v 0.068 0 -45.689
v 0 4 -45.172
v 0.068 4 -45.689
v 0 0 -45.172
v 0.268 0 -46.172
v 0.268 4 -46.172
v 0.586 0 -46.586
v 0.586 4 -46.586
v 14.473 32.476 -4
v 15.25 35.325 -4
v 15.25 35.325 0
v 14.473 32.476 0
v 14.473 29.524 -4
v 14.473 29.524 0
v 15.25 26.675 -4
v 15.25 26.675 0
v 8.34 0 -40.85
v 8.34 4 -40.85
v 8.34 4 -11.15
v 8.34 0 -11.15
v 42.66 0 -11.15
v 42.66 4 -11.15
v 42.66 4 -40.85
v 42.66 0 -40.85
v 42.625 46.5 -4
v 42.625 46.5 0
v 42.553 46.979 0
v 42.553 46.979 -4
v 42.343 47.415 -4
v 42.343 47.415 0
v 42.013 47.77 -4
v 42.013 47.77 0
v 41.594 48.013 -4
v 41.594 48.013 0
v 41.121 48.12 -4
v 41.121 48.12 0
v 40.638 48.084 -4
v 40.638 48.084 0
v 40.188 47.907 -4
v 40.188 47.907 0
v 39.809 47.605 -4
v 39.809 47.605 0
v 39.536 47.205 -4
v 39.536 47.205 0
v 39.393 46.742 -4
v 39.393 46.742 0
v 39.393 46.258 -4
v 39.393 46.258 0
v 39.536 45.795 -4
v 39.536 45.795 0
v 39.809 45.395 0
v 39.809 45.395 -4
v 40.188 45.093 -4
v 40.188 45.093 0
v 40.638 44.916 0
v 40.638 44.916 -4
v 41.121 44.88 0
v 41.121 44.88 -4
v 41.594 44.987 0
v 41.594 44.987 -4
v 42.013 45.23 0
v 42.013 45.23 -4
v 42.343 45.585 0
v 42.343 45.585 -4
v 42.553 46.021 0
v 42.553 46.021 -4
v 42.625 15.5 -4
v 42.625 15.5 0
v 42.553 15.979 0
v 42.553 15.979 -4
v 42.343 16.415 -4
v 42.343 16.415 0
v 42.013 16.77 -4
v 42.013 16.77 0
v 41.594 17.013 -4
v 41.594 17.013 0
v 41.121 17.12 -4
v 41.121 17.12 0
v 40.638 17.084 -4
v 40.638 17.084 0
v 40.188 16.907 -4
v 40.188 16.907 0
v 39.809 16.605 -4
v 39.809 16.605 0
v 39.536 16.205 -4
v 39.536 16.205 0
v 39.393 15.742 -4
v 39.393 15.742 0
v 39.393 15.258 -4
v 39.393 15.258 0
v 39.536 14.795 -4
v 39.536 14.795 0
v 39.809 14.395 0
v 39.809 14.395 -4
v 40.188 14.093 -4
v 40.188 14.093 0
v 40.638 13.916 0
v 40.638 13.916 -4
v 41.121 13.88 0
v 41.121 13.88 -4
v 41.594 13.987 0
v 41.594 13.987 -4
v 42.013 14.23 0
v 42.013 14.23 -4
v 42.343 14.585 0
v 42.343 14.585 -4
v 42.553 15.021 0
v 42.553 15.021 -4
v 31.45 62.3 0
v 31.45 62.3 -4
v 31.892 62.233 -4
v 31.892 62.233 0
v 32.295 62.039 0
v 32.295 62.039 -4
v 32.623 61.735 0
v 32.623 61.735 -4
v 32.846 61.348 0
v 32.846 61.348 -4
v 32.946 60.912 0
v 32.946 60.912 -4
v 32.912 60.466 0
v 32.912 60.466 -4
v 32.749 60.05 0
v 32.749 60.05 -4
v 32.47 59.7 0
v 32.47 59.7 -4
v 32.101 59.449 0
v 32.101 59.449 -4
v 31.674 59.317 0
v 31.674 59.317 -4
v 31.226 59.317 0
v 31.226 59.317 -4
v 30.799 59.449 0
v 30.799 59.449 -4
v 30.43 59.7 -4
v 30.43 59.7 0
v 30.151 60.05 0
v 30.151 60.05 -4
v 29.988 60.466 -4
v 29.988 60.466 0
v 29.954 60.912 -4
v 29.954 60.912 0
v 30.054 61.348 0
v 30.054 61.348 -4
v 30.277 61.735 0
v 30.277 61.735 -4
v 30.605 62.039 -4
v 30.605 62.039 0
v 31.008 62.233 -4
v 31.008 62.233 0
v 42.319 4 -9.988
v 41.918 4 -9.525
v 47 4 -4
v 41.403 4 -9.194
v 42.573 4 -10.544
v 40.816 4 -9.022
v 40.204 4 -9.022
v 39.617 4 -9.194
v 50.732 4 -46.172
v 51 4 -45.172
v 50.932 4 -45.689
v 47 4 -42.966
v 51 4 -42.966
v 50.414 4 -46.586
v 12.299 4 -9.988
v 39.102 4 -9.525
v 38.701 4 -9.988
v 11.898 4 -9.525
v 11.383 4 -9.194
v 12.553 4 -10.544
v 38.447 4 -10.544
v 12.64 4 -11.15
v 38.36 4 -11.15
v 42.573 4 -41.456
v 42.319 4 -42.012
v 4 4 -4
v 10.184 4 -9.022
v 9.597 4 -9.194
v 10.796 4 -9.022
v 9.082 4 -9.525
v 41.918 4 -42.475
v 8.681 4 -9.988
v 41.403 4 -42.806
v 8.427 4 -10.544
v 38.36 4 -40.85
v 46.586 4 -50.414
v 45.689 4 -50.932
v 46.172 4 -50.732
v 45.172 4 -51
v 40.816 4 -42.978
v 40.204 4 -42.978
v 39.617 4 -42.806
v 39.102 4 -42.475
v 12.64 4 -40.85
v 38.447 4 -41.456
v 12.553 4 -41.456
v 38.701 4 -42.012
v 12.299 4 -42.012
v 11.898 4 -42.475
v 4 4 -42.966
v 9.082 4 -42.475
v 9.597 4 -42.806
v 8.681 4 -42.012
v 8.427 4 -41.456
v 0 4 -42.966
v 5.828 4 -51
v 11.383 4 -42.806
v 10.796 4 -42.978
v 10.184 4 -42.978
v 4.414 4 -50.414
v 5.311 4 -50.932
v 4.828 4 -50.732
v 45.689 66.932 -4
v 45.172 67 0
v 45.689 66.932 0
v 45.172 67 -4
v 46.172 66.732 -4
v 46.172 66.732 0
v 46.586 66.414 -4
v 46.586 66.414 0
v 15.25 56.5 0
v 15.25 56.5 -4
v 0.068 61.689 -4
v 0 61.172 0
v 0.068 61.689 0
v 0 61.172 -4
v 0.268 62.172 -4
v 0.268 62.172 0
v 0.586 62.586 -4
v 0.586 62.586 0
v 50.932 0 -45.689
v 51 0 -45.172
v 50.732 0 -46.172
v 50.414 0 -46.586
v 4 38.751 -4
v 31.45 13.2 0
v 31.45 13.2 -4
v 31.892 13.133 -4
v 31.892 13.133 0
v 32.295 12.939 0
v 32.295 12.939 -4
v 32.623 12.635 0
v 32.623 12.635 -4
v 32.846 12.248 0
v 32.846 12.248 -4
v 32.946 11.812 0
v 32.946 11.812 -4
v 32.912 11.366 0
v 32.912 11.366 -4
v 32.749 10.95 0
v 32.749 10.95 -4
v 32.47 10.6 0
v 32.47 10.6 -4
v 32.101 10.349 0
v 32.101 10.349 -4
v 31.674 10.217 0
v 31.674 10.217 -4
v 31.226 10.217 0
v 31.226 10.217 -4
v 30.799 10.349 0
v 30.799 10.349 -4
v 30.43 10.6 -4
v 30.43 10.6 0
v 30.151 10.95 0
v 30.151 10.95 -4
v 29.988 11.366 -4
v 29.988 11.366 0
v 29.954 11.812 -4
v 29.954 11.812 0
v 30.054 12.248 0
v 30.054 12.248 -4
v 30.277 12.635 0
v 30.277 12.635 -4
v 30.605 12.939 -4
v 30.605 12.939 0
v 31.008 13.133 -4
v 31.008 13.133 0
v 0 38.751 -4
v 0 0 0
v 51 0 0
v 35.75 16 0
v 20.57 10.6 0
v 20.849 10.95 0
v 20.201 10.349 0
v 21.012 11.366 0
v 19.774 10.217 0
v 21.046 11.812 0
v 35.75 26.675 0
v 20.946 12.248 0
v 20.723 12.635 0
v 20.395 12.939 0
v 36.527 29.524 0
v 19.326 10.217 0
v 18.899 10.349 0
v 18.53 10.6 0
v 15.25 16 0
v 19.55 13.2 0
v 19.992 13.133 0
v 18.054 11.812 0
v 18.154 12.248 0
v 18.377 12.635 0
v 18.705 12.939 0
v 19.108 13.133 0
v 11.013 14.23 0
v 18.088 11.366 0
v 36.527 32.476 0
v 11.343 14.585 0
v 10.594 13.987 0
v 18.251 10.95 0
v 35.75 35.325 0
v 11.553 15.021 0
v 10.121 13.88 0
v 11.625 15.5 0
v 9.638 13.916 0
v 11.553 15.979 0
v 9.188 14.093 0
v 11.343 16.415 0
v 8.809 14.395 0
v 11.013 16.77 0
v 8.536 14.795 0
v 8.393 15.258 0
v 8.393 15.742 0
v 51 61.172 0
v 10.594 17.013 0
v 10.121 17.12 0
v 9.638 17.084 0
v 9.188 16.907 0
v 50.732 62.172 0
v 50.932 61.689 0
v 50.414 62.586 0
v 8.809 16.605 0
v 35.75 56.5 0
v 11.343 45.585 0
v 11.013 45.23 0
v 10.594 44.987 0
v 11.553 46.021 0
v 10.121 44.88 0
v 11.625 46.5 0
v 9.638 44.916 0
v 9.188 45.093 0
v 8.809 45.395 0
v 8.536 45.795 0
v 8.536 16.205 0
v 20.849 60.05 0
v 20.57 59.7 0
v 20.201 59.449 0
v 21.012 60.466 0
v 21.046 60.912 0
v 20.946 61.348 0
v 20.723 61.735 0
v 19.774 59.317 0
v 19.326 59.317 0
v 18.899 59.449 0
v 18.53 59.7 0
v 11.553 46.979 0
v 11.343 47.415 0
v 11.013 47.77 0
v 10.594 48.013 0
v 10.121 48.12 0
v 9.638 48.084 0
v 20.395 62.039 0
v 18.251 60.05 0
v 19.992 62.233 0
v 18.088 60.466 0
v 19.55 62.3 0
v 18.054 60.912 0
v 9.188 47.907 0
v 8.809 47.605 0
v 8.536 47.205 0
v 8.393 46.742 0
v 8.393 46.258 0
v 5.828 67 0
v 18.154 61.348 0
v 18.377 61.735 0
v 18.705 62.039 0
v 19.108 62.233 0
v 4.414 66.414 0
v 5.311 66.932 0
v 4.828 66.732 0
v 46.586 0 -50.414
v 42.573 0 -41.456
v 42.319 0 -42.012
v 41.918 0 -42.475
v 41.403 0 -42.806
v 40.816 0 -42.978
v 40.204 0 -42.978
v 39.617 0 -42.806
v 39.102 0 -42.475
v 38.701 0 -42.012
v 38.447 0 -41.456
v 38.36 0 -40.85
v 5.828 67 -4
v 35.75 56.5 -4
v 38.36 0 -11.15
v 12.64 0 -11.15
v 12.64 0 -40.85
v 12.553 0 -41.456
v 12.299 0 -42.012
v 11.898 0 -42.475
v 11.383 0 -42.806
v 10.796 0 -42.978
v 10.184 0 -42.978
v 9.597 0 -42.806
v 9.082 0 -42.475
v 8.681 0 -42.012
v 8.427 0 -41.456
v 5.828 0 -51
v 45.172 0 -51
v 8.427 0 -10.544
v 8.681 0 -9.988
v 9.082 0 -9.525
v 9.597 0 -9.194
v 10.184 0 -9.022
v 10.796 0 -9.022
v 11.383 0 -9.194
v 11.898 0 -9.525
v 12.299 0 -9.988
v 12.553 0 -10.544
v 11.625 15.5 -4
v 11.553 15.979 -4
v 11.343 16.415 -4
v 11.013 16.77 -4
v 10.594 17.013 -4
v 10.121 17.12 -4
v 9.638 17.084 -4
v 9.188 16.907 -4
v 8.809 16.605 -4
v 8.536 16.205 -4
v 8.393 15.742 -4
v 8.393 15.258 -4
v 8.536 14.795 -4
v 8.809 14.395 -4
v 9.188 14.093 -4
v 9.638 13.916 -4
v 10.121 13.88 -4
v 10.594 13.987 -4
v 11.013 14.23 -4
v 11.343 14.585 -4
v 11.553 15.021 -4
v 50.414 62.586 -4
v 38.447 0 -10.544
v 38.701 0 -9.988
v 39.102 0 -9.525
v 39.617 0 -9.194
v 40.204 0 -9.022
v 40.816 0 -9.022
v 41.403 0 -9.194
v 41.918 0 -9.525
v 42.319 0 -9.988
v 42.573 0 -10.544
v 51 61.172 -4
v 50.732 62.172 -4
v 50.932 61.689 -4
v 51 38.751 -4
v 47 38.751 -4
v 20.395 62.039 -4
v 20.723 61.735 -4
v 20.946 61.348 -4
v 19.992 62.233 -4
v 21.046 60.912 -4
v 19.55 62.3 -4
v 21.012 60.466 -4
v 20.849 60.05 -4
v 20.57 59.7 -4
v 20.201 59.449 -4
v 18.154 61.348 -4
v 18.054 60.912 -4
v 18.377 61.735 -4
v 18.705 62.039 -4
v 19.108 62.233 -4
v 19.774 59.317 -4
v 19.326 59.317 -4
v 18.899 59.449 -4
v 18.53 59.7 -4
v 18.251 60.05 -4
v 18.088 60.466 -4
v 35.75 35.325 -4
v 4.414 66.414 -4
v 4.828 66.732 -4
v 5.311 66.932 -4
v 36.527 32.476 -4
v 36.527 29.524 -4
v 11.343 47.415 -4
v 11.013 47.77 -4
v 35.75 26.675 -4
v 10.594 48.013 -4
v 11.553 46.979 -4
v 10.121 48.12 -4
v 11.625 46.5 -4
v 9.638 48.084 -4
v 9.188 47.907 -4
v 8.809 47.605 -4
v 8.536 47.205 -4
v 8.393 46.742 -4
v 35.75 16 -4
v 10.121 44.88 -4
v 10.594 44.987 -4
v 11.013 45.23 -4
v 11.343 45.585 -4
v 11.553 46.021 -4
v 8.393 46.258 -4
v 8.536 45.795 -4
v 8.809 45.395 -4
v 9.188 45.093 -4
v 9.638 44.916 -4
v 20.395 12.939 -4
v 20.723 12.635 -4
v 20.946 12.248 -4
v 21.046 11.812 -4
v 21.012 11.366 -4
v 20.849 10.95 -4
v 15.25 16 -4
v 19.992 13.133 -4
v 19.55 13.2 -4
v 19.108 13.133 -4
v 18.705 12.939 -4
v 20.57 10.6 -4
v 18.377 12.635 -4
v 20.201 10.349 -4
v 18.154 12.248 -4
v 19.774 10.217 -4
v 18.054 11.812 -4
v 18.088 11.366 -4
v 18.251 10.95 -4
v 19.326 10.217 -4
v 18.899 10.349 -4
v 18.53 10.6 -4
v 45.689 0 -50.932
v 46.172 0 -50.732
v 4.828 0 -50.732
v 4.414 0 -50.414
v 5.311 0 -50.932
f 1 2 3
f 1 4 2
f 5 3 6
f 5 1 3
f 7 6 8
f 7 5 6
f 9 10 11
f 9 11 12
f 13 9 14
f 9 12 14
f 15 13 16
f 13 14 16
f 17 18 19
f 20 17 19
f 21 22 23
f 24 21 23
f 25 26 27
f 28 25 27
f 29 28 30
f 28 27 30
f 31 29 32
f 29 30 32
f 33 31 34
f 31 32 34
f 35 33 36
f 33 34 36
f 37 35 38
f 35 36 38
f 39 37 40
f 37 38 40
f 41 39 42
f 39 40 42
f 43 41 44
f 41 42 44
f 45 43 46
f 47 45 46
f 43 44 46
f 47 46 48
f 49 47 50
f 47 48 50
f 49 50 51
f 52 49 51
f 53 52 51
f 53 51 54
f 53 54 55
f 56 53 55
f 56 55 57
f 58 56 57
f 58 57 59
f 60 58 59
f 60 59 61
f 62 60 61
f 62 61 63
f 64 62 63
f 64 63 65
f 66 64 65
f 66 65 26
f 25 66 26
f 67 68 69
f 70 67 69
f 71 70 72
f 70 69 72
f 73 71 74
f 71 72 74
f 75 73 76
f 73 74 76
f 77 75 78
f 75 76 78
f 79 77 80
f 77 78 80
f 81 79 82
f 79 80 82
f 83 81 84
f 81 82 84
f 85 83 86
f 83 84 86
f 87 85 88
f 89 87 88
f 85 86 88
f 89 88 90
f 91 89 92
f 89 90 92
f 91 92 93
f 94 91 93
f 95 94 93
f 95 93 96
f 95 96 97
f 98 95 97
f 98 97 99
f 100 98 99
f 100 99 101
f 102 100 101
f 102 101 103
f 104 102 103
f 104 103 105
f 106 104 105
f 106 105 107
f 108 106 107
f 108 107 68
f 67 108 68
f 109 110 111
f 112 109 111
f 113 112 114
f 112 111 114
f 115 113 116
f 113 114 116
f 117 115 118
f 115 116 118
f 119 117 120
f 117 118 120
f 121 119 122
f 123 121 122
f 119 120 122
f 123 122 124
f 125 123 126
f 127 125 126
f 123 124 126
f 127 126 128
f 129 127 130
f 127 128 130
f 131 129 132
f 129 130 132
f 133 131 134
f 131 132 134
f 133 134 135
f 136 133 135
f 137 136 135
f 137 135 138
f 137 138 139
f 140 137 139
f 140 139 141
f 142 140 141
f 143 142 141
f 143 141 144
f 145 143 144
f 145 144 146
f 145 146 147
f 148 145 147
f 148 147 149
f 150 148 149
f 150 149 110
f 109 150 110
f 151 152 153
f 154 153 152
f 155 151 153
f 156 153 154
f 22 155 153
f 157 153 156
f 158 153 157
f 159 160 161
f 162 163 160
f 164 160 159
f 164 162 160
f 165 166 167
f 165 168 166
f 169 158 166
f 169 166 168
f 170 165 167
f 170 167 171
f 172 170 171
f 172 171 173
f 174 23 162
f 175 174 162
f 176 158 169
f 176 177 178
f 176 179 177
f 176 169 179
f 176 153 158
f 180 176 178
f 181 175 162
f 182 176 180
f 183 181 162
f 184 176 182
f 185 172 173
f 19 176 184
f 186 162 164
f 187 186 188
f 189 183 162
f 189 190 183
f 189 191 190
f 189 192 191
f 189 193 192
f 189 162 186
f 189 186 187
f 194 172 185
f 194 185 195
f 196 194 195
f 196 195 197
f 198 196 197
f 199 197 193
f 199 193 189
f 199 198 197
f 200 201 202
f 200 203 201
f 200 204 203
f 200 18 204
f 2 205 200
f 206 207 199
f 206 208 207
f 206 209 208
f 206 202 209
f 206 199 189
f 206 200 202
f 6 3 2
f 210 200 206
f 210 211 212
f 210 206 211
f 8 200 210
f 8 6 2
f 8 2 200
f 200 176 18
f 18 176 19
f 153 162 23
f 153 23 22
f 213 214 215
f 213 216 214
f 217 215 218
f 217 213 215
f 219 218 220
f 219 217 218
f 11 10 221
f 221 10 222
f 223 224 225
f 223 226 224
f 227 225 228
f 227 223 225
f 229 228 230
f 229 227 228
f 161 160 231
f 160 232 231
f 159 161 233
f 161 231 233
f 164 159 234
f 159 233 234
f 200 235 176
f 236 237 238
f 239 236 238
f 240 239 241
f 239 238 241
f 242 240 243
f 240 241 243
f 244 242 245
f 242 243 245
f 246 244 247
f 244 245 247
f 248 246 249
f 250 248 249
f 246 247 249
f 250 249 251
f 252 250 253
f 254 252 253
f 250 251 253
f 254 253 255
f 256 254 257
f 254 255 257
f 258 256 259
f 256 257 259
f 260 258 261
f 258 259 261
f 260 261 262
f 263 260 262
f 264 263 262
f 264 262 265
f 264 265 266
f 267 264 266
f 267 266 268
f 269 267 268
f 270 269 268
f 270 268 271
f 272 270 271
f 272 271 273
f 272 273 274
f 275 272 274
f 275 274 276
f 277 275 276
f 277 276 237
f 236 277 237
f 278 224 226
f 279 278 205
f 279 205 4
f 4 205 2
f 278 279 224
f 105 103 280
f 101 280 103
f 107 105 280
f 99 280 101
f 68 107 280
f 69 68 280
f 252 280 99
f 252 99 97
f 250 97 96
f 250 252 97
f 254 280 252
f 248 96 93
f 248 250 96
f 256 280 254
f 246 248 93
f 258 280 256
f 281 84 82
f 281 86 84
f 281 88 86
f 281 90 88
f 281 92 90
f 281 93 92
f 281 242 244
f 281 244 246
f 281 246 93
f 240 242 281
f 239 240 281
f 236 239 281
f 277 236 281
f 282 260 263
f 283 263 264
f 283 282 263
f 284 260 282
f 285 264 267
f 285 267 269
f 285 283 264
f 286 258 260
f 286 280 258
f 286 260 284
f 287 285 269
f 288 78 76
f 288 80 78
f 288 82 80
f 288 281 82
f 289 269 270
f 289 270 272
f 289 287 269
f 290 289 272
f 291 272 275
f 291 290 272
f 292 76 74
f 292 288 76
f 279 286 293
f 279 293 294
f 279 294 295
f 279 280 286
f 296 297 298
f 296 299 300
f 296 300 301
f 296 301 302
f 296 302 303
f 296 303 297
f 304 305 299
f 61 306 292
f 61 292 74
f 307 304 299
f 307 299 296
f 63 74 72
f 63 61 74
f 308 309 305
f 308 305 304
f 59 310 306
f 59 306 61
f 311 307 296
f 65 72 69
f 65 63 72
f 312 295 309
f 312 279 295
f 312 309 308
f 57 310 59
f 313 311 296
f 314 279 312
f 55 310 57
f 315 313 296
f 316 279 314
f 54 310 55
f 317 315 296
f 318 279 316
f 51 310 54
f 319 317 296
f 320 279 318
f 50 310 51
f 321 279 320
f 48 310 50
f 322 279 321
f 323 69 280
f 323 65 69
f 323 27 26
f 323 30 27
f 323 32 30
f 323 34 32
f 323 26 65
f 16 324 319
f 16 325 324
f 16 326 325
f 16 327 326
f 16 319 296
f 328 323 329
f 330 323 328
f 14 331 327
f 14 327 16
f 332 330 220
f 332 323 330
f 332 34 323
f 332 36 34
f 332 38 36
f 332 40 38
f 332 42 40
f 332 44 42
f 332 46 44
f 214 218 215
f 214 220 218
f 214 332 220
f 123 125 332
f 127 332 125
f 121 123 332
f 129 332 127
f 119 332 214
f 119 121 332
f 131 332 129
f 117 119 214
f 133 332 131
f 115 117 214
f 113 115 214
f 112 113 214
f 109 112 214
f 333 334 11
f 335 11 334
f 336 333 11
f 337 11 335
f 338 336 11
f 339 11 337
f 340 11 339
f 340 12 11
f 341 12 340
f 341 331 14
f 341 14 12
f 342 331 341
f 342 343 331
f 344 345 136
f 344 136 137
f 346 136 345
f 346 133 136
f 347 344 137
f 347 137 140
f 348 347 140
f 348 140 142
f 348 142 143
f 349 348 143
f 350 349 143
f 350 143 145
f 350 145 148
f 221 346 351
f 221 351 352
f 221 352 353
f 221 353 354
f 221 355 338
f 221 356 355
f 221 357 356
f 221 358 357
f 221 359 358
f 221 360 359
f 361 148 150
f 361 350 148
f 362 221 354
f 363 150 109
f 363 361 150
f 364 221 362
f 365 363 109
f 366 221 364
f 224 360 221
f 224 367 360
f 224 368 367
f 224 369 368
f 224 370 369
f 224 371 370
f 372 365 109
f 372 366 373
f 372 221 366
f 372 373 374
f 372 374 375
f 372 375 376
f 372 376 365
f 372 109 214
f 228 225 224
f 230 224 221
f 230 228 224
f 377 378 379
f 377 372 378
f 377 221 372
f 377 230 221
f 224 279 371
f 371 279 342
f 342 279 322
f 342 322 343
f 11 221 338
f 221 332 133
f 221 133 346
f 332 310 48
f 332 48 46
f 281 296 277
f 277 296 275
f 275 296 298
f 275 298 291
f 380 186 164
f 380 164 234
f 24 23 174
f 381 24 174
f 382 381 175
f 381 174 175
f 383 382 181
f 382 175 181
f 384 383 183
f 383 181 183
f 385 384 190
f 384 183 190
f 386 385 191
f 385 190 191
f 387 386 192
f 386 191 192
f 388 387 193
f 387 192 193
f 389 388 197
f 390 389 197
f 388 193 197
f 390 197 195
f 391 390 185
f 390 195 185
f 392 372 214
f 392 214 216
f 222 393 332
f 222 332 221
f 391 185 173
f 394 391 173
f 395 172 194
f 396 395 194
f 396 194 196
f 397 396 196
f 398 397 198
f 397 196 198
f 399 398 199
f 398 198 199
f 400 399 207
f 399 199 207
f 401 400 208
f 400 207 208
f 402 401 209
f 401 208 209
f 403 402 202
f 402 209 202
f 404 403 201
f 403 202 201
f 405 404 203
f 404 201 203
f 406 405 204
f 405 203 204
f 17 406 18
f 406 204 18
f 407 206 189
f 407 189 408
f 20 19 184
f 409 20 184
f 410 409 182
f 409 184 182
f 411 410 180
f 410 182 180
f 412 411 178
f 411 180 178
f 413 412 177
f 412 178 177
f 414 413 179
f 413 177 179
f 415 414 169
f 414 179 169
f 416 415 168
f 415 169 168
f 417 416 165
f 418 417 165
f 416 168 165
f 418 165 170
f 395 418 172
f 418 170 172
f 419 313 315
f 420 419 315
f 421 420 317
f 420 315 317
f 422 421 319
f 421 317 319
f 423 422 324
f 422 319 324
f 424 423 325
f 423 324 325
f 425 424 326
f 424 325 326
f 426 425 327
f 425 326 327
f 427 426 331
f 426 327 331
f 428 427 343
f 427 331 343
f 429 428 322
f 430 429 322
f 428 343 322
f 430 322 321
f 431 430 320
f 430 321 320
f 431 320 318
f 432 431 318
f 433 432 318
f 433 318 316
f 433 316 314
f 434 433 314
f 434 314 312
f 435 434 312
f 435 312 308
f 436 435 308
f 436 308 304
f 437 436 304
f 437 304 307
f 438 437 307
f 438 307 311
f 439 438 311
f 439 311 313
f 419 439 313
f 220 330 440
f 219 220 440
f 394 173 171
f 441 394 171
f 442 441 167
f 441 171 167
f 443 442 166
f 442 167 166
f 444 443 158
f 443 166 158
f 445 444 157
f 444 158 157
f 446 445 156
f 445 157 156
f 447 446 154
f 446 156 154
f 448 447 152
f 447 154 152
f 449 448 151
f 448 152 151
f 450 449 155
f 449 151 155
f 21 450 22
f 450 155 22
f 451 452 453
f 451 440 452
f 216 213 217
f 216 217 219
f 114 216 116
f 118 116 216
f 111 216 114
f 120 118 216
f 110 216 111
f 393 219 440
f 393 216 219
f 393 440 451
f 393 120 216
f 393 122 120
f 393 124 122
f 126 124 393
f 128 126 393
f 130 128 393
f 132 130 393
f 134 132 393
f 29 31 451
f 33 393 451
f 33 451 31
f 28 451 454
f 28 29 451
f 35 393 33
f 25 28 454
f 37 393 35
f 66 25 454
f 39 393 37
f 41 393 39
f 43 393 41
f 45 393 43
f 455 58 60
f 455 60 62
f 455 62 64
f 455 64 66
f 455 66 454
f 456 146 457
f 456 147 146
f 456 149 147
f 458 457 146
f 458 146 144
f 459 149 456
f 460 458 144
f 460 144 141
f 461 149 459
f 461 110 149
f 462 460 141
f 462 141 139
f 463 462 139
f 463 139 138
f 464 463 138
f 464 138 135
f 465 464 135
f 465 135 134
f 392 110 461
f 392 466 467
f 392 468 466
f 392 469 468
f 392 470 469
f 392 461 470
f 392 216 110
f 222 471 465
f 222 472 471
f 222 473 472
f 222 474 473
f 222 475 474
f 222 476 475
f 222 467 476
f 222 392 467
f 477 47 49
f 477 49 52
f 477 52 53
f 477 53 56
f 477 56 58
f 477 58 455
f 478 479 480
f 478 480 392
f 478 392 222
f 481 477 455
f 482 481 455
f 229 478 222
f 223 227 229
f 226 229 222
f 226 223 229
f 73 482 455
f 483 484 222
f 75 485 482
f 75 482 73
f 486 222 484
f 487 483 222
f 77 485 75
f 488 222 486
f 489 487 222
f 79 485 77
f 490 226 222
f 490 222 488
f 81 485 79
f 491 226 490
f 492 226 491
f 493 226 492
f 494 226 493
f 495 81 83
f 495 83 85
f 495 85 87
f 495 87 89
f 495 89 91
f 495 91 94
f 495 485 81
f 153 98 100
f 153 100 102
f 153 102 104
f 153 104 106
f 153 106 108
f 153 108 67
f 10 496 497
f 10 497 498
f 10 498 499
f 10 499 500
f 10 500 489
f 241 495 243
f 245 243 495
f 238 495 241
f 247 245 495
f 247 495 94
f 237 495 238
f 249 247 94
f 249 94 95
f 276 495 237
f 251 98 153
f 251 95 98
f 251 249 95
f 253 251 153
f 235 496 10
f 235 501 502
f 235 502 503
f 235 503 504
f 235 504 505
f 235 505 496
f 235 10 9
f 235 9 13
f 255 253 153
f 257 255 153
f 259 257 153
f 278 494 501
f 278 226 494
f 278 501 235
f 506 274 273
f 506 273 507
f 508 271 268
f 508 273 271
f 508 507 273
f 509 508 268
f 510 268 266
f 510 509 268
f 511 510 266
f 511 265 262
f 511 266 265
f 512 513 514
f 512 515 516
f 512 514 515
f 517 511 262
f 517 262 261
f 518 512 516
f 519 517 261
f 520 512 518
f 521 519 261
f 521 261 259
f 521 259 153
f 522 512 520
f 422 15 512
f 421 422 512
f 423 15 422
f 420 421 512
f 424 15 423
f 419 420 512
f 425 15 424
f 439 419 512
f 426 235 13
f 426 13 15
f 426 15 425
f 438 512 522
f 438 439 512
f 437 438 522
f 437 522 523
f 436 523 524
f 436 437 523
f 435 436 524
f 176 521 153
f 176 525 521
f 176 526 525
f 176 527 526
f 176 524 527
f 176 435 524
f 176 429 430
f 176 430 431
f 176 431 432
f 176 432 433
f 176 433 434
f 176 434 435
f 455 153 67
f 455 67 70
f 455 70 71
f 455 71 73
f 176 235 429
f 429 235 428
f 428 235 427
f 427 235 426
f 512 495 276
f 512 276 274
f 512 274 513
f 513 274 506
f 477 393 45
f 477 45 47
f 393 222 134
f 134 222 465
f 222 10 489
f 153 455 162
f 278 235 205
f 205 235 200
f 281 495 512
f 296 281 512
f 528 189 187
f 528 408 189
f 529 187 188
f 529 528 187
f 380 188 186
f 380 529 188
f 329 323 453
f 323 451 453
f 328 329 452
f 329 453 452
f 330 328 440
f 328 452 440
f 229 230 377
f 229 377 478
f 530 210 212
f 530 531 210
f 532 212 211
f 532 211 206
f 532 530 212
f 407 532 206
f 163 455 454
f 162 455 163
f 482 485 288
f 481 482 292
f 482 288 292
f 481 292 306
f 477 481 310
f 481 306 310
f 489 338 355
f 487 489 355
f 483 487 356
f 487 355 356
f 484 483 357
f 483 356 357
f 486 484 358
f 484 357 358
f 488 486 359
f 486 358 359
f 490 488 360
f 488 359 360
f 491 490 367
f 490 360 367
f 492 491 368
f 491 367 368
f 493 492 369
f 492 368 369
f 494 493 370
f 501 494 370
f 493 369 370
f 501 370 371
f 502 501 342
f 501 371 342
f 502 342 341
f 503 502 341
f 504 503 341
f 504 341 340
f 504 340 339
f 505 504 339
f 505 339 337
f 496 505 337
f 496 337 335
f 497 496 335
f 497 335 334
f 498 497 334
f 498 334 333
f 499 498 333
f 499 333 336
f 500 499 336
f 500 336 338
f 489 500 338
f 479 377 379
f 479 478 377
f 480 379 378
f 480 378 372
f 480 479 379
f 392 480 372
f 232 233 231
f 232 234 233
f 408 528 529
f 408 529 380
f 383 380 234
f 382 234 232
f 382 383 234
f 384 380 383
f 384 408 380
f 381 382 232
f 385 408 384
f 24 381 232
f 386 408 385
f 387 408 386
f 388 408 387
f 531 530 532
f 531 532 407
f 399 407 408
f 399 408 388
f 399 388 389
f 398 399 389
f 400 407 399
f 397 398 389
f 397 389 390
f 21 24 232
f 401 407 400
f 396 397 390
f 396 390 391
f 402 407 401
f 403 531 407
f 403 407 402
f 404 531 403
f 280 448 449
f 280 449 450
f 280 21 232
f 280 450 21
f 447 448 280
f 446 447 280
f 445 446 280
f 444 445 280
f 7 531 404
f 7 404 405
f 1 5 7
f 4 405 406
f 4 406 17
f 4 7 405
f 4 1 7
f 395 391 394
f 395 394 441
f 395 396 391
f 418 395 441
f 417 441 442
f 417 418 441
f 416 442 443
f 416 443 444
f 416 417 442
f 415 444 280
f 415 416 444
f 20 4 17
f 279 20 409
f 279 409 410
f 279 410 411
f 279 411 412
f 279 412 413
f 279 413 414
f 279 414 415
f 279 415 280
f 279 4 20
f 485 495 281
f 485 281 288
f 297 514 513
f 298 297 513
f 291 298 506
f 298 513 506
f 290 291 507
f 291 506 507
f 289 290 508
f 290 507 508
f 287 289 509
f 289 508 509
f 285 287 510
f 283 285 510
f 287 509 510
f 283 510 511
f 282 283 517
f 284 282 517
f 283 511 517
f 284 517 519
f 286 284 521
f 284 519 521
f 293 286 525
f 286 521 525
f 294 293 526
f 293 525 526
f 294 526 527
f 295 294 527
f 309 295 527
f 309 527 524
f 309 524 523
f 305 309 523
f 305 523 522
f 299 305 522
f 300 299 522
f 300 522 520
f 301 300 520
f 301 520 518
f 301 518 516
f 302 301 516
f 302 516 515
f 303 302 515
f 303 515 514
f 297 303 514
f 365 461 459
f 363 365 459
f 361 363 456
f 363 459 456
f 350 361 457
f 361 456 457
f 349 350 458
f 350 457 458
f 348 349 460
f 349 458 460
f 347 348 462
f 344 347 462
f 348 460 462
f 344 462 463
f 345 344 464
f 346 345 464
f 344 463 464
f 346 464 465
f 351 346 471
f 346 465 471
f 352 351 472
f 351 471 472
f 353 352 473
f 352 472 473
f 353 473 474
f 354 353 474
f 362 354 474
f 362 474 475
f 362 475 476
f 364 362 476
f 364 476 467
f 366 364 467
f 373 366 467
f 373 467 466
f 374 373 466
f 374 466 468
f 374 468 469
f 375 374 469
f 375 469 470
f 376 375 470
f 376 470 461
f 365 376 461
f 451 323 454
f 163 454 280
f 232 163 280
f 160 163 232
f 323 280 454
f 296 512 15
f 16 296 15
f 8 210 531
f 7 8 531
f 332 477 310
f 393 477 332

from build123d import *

# Parameters (mm, degrees)
BOSS_EXTRUDE1_DEPTH = 51
CUT_EXTRUDE2_DEPTH  = 51
SKETCH4_R           = 1.625
CUT_EXTRUDE3_DEPTH  = 51
CHAMFER1_SIZE       = 5
FILLET1_R           = 2
SKETCH5_W           = 20.5
SKETCH5_H           = 40.5
CUT_EXTRUDE4_DEPTH  = 10
RIB1_REACH          = 100.443
SKETCH6_WALL_W      = 251.096798658
SKETCH6_WALL_H      = 4
SKETCH7_R           = 1.5
CUT_EXTRUDE5_DEPTH  = 10
SKETCH2_R           = 11.125
CUT_EXTRUDE6_DEPTH  = 10


with BuildPart() as part:
    # Sketch1 → Boss-Extrude1 (new body)
    with BuildSketch(Plane(origin=(0, 0, 0), x_dir=(0, 0, -1), z_dir=(1, 0, 0))):
        Polygon((0, 0), (0, 67), (4, 67), (4, 4), (51, 4), (51, 0), align=None)
    extrude(amount=BOSS_EXTRUDE1_DEPTH)

    # Sketch3 → Cut-Extrude2 (cut)
    with BuildSketch(Plane(origin=(0, 4, 0), x_dir=(1, 0, 0), z_dir=(0, 1, 0))):
        with BuildLine():
            Line((8.34, 40.85), (8.34, 11.15))
            ThreePointArc((8.34, 11.15), (10.49, 9), (12.64, 11.15))
            Line((12.64, 11.15), (12.64, 40.85))
            ThreePointArc((12.64, 40.85), (10.49, 43), (8.34, 40.85))
        make_face()
        with BuildLine():
            Line((38.36, 40.85), (38.36, 11.15))
            ThreePointArc((38.36, 11.15), (40.51, 9), (42.66, 11.15))
            Line((42.66, 11.15), (42.66, 40.85))
            ThreePointArc((42.66, 40.85), (40.51, 43), (38.36, 40.85))
        make_face()
    extrude(amount=-CUT_EXTRUDE2_DEPTH, mode=Mode.SUBTRACT)

    # Sketch4 → Cut-Extrude3 (cut)
    with BuildSketch(Plane.XY):
        with Locations((10, 46.5)):
            Circle(SKETCH4_R)
        with Locations((41, 46.5)):
            Circle(SKETCH4_R)
        with Locations((41, 15.5)):
            Circle(SKETCH4_R)
        with Locations((10, 15.5)):
            Circle(SKETCH4_R)
    extrude(amount=-CUT_EXTRUDE3_DEPTH, mode=Mode.SUBTRACT)

    # Chamfer1
    chamfer1_edges = [part.edges().sort_by_distance(p)[0] for p in [
        (51, 67, -2),
        (0, 67, -2),
        (0, 2, -51),
        (51, 2, -51),
    ]]
    chamfer(chamfer1_edges, length=CHAMFER1_SIZE)

    # Fillet1
    fillet1_edges = [part.edges().sort_by_distance(p)[0] for p in [
        (46, 2, -51),
        (5, 2, -51),
        (0, 62, -2),
        (0, 2, -46),
        (51, 62, -2),
        (51, 2, -46),
        (5, 67, -2),
        (46, 67, -2),
    ]]
    fillet(fillet1_edges, radius=FILLET1_R)

    # Sketch5 → Cut-Extrude4 (cut)
    with BuildSketch(Plane(origin=(0, 0, -4), x_dir=(-1, 0, 0), z_dir=(0, 0, -1))):
        with Locations((-25.5, 36.25)):
            Rectangle(SKETCH5_W, SKETCH5_H)
    extrude(amount=-CUT_EXTRUDE4_DEPTH, mode=Mode.SUBTRACT)

    # Sketch6 wall → Rib1 (add, up to next)
    with BuildSketch(Plane(origin=(51, 21.375514331, -23.483064602), x_dir=(0, -0.665587686923, -0.746319657397), z_dir=(0, 0.746319657397, -0.665587686923)), mode=Mode.PRIVATE) as rib1_sk1:
        with Locations((0, 2)):
            Rectangle(SKETCH6_WALL_W, SKETCH6_WALL_H)
    rib1_tool1 = extrude(rib1_sk1.sketch, amount=-RIB1_REACH, mode=Mode.PRIVATE) - part.part
    rib1 = rib1_tool1.solids().sort_by_distance((51, 21.375514331, -23.483064602))[0]
    add(rib1)

    # Mirror1: Rib1 across plane
    add(rib1.mirror(Plane.ZY.offset(-25.5)))

    # Sketch7 → Cut-Extrude5 (cut)
    with BuildSketch(Plane(origin=(0, 0, -4), x_dir=(-1, 0, 0), z_dir=(0, 0, -1))):
        with Locations(Location((-31.45, 60.8, 0), (0, 0, 90))):
            Circle(SKETCH7_R)
        with Locations(Location((-19.55, 60.8, 0), (0, 0, 90))):
            Circle(SKETCH7_R)
        with Locations(Location((-31.45, 11.7, 0), (0, 0, 90))):
            Circle(SKETCH7_R)
        with Locations(Location((-19.55, 11.7, 0), (0, 0, 90))):
            Circle(SKETCH7_R)
    extrude(amount=-CUT_EXTRUDE5_DEPTH, mode=Mode.SUBTRACT)

    # Sketch2 → Cut-Extrude6 (cut)
    with BuildSketch(Plane.XY):
        with Locations((25.5, 31)):
            Circle(SKETCH2_R)
    extrude(amount=-CUT_EXTRUDE6_DEPTH, mode=Mode.SUBTRACT)


solid = part.part
